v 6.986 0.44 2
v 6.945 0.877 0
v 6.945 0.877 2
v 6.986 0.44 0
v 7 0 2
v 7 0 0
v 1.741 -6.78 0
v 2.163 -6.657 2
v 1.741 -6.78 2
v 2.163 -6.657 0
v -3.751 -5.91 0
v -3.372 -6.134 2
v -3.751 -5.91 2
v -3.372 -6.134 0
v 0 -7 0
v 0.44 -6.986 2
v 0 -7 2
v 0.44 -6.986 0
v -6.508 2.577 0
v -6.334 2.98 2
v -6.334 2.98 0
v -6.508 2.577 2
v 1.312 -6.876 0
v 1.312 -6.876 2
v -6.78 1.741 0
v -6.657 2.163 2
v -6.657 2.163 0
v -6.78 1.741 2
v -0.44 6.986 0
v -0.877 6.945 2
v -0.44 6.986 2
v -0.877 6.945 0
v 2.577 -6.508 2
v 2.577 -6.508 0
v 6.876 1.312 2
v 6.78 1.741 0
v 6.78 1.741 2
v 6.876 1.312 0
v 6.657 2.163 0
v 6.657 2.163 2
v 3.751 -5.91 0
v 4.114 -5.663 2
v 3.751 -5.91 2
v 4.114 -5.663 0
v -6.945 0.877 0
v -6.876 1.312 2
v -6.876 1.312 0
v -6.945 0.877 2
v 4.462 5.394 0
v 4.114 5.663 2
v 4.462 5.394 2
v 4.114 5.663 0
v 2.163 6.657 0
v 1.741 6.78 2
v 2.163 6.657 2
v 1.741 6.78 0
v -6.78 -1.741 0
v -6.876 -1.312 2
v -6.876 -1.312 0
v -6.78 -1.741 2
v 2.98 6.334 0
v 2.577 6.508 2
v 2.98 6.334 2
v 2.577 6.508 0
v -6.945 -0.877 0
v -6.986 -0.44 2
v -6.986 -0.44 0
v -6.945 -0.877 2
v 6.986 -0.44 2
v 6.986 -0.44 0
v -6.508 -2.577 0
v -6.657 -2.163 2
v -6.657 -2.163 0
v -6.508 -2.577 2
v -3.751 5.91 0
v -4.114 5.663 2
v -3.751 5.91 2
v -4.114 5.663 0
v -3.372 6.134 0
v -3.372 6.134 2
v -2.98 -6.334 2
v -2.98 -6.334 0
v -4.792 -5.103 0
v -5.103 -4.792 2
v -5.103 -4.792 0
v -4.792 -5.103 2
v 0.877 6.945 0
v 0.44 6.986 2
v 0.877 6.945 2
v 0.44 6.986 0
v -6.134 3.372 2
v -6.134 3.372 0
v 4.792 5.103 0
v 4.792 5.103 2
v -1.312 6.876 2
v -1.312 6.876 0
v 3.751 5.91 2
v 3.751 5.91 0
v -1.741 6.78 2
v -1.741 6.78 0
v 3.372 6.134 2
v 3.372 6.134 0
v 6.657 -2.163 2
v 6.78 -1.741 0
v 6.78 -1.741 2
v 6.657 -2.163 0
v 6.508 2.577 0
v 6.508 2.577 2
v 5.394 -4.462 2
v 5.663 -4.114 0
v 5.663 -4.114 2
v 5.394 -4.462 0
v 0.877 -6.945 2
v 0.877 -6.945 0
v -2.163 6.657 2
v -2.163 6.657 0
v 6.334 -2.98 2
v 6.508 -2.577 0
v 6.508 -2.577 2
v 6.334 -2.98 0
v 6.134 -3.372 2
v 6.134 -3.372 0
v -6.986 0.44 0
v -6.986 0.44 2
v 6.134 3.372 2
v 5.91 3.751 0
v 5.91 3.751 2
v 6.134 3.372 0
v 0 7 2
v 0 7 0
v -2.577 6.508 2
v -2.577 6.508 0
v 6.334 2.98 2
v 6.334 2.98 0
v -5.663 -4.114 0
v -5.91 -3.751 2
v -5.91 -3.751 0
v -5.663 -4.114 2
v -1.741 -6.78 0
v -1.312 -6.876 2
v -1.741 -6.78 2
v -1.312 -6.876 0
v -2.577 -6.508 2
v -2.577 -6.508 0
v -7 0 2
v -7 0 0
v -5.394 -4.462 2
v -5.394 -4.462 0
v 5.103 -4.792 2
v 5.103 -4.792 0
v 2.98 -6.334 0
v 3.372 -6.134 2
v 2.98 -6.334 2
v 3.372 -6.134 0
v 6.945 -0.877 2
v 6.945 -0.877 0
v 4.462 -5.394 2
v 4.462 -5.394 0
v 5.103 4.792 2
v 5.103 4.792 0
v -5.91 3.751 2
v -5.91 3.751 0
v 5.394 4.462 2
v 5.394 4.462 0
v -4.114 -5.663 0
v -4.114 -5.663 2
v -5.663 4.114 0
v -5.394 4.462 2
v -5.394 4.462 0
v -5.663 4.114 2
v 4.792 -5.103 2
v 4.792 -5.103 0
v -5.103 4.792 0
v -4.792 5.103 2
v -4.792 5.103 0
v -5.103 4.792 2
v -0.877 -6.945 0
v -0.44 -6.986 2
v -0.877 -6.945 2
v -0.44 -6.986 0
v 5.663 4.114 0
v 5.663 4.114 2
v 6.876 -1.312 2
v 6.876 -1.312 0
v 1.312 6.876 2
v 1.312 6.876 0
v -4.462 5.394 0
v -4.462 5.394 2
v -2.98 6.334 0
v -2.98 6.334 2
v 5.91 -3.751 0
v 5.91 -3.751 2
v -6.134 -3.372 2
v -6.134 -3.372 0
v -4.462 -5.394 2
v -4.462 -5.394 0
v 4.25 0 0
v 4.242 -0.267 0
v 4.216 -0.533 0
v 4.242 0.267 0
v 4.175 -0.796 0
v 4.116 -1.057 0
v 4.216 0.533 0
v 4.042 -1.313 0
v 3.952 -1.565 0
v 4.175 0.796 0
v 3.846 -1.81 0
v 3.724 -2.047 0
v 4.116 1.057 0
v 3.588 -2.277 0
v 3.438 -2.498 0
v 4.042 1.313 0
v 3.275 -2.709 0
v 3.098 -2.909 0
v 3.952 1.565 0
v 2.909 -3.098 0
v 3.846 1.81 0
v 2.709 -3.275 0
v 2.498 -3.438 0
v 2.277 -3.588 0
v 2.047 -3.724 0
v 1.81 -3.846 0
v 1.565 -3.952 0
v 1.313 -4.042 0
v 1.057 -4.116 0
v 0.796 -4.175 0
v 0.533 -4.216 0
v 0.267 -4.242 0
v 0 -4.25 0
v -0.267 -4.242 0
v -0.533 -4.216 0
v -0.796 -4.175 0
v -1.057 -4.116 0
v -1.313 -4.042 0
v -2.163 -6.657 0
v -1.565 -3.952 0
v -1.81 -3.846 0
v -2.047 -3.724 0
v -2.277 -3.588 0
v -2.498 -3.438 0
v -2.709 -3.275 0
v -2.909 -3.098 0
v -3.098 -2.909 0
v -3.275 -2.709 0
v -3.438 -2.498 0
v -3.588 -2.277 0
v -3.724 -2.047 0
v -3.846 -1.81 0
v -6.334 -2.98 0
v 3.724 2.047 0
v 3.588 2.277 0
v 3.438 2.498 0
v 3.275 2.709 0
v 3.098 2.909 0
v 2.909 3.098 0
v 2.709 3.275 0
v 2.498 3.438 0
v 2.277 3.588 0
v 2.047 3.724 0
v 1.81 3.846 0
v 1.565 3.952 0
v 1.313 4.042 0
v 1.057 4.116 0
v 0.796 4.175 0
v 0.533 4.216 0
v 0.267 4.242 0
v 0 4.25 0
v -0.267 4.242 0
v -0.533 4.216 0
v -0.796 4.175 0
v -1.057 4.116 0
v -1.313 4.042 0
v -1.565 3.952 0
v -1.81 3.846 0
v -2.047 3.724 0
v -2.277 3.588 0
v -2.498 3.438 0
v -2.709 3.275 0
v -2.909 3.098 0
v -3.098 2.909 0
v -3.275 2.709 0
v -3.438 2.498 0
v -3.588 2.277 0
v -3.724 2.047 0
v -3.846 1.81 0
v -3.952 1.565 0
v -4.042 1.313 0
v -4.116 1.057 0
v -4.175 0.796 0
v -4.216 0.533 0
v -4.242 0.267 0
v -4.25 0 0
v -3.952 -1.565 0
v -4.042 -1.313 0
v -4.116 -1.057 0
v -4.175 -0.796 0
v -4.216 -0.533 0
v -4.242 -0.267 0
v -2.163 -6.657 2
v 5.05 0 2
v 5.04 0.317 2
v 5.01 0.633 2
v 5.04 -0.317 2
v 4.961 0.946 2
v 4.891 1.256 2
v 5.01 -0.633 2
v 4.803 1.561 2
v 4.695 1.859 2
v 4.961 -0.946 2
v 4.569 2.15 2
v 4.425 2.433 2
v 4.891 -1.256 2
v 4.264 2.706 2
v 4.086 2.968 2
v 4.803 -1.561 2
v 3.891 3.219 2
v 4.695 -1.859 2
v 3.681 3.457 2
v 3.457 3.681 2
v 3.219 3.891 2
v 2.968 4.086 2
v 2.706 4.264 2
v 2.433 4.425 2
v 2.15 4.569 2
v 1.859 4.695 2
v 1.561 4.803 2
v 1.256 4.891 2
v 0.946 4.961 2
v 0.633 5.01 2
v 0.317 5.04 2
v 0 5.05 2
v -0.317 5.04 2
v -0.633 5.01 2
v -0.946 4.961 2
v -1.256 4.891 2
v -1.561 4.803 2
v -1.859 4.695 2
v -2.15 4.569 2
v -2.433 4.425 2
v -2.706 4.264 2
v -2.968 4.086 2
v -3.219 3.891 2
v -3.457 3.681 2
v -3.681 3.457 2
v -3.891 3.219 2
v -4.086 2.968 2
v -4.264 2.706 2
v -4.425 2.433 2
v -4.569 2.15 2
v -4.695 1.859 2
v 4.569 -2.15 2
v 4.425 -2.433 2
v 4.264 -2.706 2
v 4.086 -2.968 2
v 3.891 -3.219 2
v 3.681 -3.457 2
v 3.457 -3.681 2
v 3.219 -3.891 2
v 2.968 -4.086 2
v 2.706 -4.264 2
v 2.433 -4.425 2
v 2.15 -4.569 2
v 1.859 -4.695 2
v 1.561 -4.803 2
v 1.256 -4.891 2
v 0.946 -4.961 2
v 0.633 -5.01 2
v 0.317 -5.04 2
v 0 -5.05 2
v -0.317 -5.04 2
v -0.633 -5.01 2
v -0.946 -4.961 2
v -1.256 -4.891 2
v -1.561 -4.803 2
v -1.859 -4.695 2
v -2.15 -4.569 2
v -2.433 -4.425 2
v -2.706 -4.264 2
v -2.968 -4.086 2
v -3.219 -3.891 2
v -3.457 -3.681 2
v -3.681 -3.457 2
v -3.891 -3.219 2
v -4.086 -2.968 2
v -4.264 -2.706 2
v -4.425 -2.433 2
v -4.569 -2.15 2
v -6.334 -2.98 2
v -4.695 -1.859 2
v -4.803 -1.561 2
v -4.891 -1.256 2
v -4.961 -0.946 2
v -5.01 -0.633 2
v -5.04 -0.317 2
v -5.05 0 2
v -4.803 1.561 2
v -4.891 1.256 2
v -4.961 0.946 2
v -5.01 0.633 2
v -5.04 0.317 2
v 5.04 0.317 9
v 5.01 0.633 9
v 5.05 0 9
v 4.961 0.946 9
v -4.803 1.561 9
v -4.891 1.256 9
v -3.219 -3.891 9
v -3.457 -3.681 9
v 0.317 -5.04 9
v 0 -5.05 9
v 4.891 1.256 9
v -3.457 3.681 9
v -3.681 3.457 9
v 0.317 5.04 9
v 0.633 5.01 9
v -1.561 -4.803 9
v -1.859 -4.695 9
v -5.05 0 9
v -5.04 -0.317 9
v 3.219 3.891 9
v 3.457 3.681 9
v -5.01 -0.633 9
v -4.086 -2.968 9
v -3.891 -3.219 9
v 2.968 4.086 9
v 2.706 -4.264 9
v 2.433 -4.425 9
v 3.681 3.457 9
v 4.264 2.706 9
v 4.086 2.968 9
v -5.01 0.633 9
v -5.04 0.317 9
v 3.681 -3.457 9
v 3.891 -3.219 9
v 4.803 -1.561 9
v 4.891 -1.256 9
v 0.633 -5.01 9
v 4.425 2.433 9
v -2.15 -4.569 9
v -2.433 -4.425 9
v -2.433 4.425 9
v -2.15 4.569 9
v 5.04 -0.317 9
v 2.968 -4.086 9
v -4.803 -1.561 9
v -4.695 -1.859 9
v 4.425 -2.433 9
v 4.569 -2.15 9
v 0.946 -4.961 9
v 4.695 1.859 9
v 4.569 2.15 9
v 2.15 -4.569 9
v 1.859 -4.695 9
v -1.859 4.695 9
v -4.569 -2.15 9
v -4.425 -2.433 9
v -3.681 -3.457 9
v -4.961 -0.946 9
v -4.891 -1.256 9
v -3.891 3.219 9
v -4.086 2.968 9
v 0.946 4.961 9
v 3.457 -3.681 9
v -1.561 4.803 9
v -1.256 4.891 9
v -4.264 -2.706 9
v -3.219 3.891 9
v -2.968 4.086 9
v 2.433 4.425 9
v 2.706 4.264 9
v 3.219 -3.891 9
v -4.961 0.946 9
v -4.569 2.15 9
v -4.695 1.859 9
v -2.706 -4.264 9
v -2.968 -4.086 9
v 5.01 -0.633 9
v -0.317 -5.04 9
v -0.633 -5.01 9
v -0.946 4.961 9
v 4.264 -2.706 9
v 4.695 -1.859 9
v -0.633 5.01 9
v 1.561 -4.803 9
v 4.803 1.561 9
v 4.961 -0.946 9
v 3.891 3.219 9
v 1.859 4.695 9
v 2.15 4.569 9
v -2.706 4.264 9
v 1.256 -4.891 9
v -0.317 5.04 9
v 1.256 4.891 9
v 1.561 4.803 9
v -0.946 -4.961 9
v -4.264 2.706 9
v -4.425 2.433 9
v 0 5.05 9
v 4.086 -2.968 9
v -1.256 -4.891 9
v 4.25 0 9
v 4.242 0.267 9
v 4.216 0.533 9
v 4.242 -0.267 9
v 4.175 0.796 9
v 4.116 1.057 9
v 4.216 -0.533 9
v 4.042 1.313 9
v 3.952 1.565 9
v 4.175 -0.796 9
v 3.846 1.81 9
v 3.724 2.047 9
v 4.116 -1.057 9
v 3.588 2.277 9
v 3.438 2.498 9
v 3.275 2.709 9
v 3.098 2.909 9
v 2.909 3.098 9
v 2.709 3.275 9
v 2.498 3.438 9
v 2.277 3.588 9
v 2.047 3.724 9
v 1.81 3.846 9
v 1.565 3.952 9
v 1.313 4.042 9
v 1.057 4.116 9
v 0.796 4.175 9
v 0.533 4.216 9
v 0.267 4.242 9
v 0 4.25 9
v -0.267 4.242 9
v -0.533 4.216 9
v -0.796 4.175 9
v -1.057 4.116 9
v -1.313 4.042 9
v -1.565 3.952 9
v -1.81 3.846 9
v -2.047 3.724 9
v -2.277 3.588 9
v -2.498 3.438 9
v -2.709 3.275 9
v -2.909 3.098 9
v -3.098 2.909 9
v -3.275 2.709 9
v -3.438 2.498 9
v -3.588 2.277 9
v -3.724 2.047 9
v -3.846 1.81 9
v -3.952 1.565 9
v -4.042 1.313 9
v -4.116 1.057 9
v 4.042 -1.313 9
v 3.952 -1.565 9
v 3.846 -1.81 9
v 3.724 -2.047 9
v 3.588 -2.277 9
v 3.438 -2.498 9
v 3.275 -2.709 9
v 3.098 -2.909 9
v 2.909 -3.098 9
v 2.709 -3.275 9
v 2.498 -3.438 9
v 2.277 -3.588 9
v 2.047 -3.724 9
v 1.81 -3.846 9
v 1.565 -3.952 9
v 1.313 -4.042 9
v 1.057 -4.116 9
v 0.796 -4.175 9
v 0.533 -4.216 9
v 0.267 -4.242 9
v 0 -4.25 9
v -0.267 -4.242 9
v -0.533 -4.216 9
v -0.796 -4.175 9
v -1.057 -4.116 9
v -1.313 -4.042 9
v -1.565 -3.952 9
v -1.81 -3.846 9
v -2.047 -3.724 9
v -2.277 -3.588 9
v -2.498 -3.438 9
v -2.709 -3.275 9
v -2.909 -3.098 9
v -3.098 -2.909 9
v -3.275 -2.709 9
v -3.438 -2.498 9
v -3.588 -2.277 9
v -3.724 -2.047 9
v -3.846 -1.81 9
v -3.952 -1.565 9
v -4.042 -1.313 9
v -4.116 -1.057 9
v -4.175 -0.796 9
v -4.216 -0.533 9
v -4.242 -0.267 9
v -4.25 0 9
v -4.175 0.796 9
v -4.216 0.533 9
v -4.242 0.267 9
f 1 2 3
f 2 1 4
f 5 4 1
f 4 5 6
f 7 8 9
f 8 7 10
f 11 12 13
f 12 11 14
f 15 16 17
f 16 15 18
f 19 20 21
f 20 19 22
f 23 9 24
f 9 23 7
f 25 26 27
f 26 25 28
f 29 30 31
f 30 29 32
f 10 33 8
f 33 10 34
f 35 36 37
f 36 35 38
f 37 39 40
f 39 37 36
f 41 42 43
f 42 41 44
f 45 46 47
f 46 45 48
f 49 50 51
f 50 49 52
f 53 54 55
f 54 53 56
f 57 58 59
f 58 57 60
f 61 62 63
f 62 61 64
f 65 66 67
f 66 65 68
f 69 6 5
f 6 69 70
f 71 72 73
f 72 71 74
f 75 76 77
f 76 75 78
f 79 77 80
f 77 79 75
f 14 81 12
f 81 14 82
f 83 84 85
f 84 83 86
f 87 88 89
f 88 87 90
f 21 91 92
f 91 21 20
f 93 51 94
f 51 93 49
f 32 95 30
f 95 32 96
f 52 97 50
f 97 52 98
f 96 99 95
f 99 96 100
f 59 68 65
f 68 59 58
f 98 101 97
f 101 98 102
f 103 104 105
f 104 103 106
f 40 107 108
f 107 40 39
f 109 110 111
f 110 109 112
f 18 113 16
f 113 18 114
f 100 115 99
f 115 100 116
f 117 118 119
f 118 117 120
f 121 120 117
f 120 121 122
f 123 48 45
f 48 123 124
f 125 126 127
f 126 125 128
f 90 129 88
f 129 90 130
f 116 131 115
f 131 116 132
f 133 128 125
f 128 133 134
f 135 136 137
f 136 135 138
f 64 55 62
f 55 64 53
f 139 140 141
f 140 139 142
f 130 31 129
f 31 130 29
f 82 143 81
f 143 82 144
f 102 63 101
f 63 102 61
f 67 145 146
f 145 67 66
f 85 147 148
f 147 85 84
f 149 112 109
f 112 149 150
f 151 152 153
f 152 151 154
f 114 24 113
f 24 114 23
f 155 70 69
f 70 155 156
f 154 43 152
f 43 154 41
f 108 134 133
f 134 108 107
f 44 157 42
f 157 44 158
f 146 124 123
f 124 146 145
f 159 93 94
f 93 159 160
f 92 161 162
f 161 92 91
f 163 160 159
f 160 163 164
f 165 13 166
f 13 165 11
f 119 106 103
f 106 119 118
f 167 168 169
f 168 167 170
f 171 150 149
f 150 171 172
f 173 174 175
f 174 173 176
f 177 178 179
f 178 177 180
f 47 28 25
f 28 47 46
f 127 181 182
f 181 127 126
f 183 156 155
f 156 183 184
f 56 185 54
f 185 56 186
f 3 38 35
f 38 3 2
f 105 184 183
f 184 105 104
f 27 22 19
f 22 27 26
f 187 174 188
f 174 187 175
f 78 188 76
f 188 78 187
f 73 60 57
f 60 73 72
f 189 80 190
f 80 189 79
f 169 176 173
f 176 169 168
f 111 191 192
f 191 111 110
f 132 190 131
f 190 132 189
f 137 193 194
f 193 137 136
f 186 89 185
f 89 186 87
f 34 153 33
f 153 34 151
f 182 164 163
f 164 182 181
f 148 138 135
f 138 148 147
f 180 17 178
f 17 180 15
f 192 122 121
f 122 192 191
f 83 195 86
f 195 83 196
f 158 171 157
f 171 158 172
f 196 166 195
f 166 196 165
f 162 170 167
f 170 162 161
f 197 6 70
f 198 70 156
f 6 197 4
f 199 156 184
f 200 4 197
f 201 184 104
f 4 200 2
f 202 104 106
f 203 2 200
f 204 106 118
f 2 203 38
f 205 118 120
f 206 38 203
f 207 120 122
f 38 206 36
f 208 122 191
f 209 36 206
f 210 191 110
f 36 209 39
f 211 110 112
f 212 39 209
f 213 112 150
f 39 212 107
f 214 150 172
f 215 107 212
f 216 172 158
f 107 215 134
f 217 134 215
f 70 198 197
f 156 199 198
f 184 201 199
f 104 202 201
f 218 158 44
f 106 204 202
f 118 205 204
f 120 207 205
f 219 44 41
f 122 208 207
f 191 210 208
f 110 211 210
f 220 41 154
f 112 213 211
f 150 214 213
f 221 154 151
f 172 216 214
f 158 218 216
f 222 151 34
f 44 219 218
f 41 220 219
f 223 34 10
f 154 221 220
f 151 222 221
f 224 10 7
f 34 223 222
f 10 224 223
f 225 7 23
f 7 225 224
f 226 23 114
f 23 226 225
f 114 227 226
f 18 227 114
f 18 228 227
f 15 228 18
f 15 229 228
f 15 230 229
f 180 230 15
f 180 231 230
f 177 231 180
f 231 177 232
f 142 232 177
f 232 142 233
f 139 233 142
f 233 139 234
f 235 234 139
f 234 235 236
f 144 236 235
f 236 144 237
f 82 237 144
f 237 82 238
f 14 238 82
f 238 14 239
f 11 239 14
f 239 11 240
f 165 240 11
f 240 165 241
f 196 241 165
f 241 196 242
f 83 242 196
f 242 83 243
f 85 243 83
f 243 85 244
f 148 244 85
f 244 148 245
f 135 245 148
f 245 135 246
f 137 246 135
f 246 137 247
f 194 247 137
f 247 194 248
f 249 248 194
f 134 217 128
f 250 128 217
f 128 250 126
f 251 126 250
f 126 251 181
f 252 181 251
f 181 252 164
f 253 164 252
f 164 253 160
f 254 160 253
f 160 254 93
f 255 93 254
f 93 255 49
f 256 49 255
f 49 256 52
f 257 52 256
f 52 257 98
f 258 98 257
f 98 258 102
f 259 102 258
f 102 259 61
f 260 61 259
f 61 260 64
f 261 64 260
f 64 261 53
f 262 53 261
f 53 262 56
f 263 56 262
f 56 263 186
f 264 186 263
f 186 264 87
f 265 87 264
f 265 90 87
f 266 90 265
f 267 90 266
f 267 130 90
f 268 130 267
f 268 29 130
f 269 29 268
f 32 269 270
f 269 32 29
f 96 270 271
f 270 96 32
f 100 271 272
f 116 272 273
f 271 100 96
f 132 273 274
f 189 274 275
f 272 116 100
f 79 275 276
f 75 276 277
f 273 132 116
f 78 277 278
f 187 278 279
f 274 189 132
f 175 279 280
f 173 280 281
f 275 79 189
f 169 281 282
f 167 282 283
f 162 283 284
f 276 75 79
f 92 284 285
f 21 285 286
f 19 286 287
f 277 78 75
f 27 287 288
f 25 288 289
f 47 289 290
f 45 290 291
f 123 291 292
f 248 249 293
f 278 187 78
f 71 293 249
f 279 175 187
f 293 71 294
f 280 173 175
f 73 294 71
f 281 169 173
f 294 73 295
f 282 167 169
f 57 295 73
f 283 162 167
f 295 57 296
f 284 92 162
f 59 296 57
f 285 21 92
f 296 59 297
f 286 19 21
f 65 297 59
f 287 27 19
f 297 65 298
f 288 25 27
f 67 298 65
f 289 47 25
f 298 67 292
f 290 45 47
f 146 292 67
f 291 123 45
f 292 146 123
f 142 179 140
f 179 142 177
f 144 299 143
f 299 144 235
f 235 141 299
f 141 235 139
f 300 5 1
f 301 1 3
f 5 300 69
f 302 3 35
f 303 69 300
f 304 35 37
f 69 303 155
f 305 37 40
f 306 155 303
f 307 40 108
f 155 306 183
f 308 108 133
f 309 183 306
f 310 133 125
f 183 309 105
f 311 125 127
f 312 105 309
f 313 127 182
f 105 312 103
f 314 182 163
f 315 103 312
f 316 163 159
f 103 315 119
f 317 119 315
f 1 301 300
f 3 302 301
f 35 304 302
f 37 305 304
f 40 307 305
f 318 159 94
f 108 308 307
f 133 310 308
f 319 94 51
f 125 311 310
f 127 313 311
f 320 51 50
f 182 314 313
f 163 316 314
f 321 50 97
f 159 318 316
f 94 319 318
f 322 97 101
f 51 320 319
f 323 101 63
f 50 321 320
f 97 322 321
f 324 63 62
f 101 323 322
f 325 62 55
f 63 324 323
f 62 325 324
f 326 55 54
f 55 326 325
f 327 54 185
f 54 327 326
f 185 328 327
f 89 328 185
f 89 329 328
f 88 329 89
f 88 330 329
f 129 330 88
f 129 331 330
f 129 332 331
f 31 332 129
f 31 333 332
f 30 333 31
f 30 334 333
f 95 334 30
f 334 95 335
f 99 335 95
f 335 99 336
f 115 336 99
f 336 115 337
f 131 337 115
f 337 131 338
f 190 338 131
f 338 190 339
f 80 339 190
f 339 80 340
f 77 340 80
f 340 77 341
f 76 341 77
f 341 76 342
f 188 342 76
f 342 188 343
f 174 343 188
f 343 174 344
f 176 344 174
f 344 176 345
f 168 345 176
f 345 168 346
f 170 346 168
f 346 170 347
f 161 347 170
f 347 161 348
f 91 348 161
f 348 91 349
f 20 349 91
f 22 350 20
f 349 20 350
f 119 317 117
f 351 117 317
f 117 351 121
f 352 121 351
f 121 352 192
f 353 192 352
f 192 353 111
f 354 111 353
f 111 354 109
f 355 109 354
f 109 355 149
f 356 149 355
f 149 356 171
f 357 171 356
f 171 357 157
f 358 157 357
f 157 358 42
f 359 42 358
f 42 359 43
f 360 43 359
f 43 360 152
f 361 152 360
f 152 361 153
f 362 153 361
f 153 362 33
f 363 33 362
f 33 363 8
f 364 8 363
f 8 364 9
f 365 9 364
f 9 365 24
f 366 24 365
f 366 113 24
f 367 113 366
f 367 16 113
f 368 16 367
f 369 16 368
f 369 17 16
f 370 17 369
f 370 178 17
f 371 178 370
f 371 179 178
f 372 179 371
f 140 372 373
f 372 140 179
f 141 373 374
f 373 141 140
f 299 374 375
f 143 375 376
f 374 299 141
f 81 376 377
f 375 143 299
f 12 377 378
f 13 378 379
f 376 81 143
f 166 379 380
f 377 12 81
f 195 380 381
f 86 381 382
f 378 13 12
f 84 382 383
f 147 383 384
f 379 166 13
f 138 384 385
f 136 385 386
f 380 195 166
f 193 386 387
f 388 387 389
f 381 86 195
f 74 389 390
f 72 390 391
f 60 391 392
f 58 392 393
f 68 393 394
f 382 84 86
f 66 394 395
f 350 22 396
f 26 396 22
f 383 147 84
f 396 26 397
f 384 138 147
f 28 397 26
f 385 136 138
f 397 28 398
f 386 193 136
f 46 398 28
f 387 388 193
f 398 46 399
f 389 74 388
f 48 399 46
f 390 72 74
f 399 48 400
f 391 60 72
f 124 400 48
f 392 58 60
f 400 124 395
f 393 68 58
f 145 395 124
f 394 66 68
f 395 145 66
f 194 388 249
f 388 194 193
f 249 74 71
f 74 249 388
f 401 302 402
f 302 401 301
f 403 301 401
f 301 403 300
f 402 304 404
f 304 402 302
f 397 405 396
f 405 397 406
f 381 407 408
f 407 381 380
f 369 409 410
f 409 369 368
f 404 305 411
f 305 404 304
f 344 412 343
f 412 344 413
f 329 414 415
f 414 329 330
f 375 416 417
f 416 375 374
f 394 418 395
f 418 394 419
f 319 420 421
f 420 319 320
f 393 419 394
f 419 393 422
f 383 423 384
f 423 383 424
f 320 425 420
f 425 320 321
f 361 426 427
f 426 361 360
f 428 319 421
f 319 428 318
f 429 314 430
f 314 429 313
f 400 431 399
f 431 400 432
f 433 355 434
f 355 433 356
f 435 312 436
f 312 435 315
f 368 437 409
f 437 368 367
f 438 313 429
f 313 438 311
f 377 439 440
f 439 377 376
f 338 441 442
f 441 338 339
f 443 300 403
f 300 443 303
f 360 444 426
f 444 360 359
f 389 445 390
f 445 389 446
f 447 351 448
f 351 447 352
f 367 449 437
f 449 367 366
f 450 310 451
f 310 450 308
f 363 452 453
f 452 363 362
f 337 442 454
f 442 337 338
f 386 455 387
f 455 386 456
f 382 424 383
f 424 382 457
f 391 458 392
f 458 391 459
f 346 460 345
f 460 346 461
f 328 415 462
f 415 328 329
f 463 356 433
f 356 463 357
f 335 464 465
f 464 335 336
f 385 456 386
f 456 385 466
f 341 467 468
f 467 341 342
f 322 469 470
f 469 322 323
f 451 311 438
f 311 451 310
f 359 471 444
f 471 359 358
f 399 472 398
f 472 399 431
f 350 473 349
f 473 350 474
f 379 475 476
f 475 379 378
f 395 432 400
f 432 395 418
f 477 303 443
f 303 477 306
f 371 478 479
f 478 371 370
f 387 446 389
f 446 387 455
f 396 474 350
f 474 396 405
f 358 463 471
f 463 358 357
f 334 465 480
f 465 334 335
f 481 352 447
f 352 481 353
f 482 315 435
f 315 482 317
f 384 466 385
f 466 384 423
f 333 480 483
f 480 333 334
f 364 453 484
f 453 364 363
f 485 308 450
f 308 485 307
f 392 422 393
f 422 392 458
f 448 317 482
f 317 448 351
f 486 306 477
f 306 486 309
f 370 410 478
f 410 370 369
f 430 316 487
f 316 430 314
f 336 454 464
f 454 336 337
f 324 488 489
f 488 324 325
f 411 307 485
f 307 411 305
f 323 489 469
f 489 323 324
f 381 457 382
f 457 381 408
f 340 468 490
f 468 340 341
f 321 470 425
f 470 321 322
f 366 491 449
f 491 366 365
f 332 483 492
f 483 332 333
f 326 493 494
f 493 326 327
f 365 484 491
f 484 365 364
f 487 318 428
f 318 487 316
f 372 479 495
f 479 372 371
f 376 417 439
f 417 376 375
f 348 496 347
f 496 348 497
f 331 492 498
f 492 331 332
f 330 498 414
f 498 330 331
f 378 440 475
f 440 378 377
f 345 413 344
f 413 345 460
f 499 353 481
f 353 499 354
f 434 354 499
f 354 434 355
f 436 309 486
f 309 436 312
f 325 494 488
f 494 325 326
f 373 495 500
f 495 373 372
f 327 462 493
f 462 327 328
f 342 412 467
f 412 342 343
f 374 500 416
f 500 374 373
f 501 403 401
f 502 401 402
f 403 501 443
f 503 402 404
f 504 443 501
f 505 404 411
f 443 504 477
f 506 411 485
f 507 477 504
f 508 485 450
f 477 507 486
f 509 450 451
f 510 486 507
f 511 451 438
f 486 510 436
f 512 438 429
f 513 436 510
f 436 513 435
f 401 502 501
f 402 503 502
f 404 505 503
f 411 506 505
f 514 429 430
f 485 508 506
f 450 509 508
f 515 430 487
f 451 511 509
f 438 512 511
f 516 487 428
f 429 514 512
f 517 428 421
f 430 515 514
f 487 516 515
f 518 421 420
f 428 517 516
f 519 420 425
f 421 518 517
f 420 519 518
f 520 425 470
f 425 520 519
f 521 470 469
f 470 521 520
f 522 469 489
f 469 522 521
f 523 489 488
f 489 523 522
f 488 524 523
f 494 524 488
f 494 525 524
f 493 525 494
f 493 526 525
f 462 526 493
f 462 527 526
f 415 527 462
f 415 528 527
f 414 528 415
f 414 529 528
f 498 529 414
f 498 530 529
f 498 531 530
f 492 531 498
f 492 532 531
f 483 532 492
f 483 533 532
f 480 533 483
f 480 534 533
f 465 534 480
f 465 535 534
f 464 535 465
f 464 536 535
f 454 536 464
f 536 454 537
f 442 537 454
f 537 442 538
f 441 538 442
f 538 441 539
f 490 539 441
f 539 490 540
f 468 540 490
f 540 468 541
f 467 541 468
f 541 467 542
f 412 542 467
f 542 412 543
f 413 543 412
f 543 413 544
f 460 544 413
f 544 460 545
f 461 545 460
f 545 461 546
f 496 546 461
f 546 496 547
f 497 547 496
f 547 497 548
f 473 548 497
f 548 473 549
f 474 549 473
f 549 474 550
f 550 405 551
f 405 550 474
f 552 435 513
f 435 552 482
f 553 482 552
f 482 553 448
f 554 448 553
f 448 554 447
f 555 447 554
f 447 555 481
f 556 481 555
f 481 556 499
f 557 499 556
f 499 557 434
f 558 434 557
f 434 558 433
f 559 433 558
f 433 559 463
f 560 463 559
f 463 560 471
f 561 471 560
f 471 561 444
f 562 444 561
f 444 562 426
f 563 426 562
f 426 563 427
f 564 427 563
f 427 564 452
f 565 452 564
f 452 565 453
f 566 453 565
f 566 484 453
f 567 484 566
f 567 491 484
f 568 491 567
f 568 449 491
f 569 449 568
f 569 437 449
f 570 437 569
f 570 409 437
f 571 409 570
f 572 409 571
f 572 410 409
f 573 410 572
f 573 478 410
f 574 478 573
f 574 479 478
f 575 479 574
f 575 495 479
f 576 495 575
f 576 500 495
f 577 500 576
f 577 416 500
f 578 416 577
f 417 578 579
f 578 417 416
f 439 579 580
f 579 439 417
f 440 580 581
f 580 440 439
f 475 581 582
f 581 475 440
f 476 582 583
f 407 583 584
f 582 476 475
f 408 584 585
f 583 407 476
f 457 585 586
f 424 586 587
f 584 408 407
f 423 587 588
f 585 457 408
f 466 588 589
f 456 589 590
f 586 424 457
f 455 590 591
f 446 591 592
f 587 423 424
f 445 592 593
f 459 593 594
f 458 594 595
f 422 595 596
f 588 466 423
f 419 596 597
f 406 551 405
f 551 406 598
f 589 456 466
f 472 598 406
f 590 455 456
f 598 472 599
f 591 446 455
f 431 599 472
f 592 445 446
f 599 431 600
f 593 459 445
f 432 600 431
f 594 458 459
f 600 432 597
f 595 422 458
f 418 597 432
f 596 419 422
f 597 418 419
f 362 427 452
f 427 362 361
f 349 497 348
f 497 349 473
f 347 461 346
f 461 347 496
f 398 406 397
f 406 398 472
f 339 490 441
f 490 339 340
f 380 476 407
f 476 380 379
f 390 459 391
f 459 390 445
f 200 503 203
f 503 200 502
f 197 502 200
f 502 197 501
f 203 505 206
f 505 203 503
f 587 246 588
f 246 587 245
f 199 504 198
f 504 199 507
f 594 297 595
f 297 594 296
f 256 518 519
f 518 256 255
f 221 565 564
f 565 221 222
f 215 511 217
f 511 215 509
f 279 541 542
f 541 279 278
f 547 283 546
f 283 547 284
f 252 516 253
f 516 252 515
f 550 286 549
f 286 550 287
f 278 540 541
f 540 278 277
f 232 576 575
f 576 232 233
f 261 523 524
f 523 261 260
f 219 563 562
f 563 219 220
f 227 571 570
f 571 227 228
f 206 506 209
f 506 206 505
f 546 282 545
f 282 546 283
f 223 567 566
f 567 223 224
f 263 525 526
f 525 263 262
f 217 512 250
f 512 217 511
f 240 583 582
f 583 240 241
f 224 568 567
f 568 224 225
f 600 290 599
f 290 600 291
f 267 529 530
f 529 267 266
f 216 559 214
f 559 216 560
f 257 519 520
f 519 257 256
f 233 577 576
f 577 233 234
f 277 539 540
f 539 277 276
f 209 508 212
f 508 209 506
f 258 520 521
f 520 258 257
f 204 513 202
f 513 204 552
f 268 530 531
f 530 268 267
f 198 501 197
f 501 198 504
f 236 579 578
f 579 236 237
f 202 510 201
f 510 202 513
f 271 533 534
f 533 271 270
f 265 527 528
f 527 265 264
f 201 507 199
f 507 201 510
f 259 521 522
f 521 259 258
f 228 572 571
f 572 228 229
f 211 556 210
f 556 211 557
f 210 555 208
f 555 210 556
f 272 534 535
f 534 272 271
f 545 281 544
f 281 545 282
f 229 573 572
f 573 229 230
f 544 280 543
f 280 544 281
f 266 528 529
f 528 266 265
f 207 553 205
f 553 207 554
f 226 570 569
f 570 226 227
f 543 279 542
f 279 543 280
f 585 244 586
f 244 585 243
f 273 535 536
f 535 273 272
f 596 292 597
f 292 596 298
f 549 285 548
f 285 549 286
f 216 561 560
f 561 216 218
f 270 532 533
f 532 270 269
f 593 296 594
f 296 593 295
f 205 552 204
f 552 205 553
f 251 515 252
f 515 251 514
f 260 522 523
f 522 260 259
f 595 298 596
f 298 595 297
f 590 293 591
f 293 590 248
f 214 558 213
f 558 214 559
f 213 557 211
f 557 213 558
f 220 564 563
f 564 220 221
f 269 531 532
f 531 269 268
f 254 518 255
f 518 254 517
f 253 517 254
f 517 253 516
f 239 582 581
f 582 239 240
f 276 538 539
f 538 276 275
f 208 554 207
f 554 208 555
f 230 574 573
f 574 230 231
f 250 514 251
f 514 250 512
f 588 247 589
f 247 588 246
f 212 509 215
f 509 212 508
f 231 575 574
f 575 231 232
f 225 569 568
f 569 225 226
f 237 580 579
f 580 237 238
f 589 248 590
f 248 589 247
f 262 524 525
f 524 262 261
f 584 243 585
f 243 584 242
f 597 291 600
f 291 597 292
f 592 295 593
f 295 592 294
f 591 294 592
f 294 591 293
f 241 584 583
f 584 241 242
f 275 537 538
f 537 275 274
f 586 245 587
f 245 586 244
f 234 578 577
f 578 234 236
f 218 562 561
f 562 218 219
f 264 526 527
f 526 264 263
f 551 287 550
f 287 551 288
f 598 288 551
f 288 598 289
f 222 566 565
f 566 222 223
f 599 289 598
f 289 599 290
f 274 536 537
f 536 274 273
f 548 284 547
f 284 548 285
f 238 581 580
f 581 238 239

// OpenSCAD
$fn=100;

/** Wheel External side axle
 */
module screwBoltsExt() {
    // screw diameter
    // 6.4 for 6mm, 8.5 for 8mm, 7.6 for 7mm
    screwDiamExt=8.5;
    screwDiamInt=7.6;
    
    difference() {
        union() {
            cylinder(d=14,h=2);
            cylinder(d=10+0.1,h=2+7);        
        }
        
        translate([0,0,-0.01]) cylinder(d=screwDiamExt,h=10+0.01);         
    }
}


/** Wheel Internal side axle
 */
module screwBoltsInt() {
    // screw diameter
    // 6.4 for 6mm, 8.5 for 8mm, 7.6 for 7mm
    screwDiamExt=8.5;
    screwDiamInt=7.6;
    
    difference() {
        union() {
            cylinder(d=15,h=8);
            translate([0,0,8]) cylinder(d1=15, d2=26,h=6);
            translate([0,0,8+6]) cylinder(d=26,h=3+3);                   
        }
        translate([0,0,8+6+3]) cylinder(d=20,h=3+0.01);
        for(rot=[1:6]) {
            rotate([0,0,360 - rot * 360/6])
                translate([12.5,0,6+12.5]) 
                    cube([6,2.3,3+0.01], center=true);
        }
        // M3 fix screw
        translate([0,0,4.5]) rotate([0,90,0]) cylinder(d=2.3,h=40, center=true);
        
        // Axle
        translate([0,0,-0.01]) cylinder(d=screwDiamInt,h=25+0.02);
    }
}

/** Wheel Axle to motor coupling
 */
module screwBoltsShaft() {
    // screw diameter
    // 6.4 for 6mm, 8.5 for 8mm, 7.6 for 7mm
    screwDiamExt=8.5;
    screwDiamInt=7.6;

    motorAxleDiam=6.4;
    
    difference() {
        cylinder(d=21,h=30);
        
        // rotor axle
        translate([0,0,-0.01]) cylinder(d=motorAxleDiam,h=14+0.02);
        translate([0,0,14]) cylinder(d1=motorAxleDiam, d2=screwDiamInt,h=2+0.01);
        translate([0,0,14+2]) cylinder(d=screwDiamInt,h=14+0.02);
        
        // M3 fix screws
        translate([4.5,-5.6/2,-0.01]) cube([3.2,5.6,9+0.02]); 
        translate([20,0,5]) rotate([0,90,0]) cylinder(d=3.1,h=40, center=true);
        
        translate([4.5,-5.6/2,30-9]) cube([3.2,5.6,9+0.02]); 
        translate([20,0,30-5]) rotate([0,90,0]) cylinder(d=3.1,h=40, center=true);
    }
}

/** Small axle to bearing adapter
 */
module bearingAxle() {
    bearingH=7;
    screwDiamInt=7.4;
    difference() {
        union() {
            cylinder(d1=15,d2=12,h=2);
            translate([0,0,2]) cylinder(d=8,h=bearingH);
        }
        cylinder(d=screwDiamInt,h=10);
    }
}

/** Bearing to plate support
 */
module bearingHolder() {        
    // bearing 608zz
    br = 11.15; // bearing radius with tolerance for insertion
    bh = 7;     // bearing height
    ir = 4.3;    // threaded rod radius + ample tolerance
    t = 4; 
    e = 0.02; 
    
    difference() {
        union() {
            cylinder(r=br+e+4, h=bh+e+1);
            hull() {
                h=bh+e+1;
                translate([0,15,h/2]) cube([45,5,h], center=true);
                translate([0,5,h/2]) cube([20,5,h+2], center=true);
            }
        }
        translate([0,0,-2.005]) cylinder(r=br+e, h=bh+e+2.02);
        translate([0,0,bh]) cylinder(r1=br+e, r2=br+e-2, h=3+0.01);
    }
}

screwBoltsExt();
//screwBoltsInt();
//screwBoltsShaft();
//bearingAxle();
//bearingHolder();
